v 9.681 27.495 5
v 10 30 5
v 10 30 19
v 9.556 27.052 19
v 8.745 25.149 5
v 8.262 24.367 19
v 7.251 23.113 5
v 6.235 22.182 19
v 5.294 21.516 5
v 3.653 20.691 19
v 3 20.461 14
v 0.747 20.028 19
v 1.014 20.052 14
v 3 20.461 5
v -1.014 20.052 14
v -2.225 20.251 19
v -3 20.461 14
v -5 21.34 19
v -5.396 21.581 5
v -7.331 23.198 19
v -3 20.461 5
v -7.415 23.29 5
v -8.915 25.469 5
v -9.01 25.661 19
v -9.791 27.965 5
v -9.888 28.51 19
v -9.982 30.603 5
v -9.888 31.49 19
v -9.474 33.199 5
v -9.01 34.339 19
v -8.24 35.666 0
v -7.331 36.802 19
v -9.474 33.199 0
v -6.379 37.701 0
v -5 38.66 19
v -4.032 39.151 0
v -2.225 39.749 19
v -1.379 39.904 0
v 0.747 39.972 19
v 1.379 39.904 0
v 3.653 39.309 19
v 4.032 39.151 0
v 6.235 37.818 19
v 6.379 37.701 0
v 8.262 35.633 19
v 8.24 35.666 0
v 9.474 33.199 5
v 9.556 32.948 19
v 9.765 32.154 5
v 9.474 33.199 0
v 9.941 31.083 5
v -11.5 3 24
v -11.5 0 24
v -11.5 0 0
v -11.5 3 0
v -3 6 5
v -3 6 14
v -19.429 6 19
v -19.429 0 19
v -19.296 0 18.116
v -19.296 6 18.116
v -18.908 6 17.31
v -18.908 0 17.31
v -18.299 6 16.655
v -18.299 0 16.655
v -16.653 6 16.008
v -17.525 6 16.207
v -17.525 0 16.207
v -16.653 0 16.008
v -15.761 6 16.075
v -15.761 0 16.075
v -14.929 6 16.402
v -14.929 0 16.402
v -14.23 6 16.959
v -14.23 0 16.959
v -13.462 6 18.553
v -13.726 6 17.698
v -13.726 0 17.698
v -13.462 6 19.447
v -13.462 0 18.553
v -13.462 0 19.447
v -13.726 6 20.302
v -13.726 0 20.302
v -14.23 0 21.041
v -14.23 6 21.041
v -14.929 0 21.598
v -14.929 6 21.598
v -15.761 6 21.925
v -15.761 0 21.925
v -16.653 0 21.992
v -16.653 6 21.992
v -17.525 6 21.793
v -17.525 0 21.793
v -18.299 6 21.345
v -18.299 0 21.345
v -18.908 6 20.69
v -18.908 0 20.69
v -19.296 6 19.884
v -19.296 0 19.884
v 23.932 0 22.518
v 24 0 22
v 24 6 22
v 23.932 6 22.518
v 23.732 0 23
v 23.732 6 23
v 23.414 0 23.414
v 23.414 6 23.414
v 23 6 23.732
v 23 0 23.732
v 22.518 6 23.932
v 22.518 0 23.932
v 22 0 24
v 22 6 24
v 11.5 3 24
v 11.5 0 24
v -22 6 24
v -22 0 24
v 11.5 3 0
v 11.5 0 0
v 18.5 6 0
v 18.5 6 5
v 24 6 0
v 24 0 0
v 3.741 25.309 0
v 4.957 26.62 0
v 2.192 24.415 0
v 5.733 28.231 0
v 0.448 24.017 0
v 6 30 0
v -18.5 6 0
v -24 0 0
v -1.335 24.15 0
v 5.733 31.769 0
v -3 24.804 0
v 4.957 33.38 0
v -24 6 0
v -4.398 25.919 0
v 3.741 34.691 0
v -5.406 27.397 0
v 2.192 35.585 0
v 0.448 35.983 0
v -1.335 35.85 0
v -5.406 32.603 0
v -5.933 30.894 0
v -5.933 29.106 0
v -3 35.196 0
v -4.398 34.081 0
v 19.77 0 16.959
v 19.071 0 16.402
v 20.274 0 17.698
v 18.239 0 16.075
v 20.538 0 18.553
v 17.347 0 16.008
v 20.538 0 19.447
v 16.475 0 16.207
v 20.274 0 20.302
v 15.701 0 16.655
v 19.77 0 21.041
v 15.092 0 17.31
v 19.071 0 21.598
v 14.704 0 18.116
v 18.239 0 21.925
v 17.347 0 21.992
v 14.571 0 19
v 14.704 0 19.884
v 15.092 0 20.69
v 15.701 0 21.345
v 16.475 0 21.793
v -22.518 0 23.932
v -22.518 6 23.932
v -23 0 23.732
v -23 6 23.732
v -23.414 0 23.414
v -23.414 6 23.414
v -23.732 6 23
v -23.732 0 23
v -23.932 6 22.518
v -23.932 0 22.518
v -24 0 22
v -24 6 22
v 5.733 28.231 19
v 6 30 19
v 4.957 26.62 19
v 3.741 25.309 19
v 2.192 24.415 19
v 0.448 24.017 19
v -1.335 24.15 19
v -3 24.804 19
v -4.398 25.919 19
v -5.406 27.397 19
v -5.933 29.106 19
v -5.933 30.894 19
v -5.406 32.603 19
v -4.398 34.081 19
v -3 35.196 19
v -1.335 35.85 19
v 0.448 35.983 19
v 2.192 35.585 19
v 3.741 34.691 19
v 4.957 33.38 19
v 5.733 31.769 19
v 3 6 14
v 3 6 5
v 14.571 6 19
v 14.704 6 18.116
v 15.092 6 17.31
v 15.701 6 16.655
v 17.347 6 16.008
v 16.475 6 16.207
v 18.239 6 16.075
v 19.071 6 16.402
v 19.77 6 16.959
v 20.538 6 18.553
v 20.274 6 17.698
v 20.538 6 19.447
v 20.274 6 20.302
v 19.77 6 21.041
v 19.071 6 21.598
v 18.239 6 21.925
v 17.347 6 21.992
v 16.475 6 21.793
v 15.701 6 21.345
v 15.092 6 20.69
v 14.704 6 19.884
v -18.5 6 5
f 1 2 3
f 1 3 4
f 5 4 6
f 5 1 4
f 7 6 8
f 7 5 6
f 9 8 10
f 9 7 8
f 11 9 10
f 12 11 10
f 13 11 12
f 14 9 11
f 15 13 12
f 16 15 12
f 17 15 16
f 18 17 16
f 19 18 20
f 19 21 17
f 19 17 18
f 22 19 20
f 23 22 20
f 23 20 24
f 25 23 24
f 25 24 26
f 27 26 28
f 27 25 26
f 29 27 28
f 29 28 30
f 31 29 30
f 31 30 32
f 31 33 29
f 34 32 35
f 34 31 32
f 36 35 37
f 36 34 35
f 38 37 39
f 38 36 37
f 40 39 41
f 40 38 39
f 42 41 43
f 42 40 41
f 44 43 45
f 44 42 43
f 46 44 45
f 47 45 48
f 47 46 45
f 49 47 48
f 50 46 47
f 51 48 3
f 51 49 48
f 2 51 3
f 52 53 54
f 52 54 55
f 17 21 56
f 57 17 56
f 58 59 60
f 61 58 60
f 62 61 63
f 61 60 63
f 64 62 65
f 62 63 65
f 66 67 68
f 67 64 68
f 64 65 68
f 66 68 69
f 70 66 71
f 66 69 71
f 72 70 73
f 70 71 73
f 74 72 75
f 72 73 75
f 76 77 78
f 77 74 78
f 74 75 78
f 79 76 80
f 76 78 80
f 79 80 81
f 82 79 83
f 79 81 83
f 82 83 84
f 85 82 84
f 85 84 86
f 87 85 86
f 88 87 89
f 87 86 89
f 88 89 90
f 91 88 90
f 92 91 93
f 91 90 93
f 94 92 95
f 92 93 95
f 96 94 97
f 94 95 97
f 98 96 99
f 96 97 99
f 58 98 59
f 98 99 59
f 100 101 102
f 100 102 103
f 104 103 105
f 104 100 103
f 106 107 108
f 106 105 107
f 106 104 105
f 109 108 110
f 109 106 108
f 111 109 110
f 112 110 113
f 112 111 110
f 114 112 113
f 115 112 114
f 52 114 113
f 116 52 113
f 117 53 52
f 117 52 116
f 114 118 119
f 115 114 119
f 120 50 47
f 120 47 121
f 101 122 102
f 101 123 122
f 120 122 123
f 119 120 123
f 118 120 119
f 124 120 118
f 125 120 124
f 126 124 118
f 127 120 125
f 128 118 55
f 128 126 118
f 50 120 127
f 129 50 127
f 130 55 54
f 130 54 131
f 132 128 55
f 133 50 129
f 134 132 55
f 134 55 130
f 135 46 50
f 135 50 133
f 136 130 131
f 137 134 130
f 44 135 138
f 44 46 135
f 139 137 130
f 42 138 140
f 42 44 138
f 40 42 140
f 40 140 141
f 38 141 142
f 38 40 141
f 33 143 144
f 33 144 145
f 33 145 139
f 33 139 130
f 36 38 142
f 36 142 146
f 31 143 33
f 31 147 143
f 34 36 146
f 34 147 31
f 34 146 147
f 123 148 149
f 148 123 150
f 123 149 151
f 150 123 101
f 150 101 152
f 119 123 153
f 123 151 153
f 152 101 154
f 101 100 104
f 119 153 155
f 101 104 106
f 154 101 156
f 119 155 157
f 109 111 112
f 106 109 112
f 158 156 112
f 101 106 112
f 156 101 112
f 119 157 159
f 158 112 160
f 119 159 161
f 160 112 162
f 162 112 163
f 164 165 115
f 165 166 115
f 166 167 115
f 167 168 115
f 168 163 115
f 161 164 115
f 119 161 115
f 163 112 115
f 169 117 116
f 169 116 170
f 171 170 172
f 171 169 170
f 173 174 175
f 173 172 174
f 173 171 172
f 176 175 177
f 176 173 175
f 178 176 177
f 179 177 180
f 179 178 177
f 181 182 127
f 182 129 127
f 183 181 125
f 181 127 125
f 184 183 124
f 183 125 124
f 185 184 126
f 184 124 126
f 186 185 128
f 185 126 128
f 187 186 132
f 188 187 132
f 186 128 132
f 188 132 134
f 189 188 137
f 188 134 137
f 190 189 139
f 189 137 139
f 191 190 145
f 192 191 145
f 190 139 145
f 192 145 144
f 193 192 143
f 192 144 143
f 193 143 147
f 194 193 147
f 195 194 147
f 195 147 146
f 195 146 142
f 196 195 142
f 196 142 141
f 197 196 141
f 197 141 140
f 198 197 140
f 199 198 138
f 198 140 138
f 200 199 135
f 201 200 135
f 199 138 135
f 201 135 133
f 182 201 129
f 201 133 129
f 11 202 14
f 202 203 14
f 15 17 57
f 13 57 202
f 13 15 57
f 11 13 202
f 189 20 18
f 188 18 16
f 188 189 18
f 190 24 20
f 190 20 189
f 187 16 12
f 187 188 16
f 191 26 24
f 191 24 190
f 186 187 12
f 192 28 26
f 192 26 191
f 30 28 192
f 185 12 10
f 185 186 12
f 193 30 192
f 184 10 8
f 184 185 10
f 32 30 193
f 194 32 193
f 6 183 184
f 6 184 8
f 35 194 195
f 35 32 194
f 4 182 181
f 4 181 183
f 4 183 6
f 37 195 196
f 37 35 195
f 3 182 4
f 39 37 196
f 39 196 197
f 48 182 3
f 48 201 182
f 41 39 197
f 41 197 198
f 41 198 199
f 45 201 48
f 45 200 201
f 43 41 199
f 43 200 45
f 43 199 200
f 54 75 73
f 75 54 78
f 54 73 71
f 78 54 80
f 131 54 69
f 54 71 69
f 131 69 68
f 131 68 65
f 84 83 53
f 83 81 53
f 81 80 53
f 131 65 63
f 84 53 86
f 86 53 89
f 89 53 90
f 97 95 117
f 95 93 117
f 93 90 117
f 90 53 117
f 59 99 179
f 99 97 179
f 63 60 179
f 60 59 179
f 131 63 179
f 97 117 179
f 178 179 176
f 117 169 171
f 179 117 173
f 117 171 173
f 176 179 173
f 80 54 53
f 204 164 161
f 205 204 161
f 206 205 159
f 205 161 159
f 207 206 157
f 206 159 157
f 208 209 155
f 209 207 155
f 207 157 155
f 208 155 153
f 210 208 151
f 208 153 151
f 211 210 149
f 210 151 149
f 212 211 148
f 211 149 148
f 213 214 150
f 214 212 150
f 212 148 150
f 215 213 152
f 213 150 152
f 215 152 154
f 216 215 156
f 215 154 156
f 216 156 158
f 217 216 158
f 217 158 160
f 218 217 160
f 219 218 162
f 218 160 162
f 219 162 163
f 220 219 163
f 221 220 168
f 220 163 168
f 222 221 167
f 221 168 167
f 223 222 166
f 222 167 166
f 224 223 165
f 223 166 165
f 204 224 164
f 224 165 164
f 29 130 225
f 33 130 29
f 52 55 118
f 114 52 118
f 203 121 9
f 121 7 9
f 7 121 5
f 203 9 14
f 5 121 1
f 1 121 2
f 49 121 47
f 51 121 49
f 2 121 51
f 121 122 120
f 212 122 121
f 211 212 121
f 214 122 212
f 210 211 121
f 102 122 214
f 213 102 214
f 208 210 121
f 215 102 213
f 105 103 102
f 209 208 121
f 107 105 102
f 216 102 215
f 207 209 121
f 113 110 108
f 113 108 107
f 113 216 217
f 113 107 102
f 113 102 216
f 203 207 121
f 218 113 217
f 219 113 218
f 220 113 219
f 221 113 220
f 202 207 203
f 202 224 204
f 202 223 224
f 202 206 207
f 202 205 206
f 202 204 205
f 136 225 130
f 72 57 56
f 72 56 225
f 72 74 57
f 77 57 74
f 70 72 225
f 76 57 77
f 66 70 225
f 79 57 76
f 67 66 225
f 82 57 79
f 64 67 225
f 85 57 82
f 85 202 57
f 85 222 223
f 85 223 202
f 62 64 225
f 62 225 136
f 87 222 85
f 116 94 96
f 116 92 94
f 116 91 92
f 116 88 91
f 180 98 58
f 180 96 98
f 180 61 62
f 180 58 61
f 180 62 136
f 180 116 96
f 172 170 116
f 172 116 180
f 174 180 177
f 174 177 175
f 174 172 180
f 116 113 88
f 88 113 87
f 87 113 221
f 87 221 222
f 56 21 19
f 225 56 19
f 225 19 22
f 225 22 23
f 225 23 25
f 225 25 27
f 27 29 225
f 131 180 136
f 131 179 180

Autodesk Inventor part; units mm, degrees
ref_plane "YZ Plane" through (0, 0, 0) normal (1, 0, 0) x (0, 1, 0)
ref_plane "XZ Plane" through (0, 0, 0) normal (0, 1, 0) x (-1, 0, 0)
ref_plane "XY Plane" through (0, 0, 0) normal (0, 0, 1) x (1, 0, 0)
sketch "草图1" plane through (0, 0, 0) normal (0, 1, 0) x (-1, 0, 0)
  line L0 (24, 0) -> (-24, 0)
  line L1 (-24, 0) -> (-24, 22)
  line L2 (-22, 24) -> (22, 24)
  line L3 (24, 22) -> (24, 0)
  line L4 (0, 29.295577) -> (0, -8.008859)
  arc A0 (24, 22) -> (22, 24) centre (22, 22) ccw
  arc A1 (-22, 24) -> (-24, 22) centre (-22, 22) ccw
  line L5 (28.197943, 19) -> (-37.870085, 19) construction
  circle A2 centre (16.428853, 19) radius 3
  circle A3 centre (-17.571147, 19) radius 3
  point P0 (0, 0)
  point P1 (-24, 24)
  dimension "d0" = 24
  dimension "d1" = 48
  dimension "d2" = 2
  dimension "d3" = 5
  dimension "d4" = 6
  dimension "d5" = 6
  dimension "d6" = 34
extrude "拉伸1" add sketch "草图1" along normal blind 6
sketch "草图2" plane through (0, 0, 0) normal (0, 0, 1) x (1, 0, 0)
  line L0 (22, 0) -> (-22, 0) projected
  line L1 (22, 0) -> (22, 6) projected
  line L2 (-22, 6) -> (22, 6) projected
  line L3 (-22, 0) -> (-22, 6) projected
  line L4 (11.5, -3) -> (-11.5, -3)
  line L5 (-11.5, -3) -> (-11.5, 3)
  line L6 (-11.5, 3) -> (11.5, 3)
  line L7 (11.5, 3) -> (11.5, -3)
  line L8 (11.5, -3) -> (-11.5, 3) construction
  line L9 (-11.5, -3) -> (11.5, 3) construction
  point P0 (0, 0)
  dimension "d9" = 23
  dimension "d10" = 6
extrude "拉伸2" cut sketch "草图2" along normal blind 30 contours L7 L4 L5 L0 | L0 L5 L6 L7
sketch "草图3" plane through (0, 0, 0) normal (0, 0, 1) x (1, 0, 0)
  circle A0 centre (0, 30) radius 10
  line L0 (11.5, 3) -> (11.5, 0)
  line L1 (22, 0) -> (11.5, 0)
  line L2 (22, 0) -> (22, 6)
  line L3 (-22, 6) -> (22, 6)
  line L4 (-22, 0) -> (-22, 6)
  line L5 (-11.5, 0) -> (-22, 0)
  line L6 (-11.5, 0) -> (-11.5, 3)
  line L7 (-11.5, 3) -> (11.5, 3)
  line L8 (0, -6.997144) -> (0, 46.686565)
  circle A1 centre (0, 30) radius 6
  point P0 (0, 0)
  dimension "d13" = 20
  dimension "d14" = 30
  dimension "d15" = 12
extrude "拉伸3" add sketch "草图3" along normal blind 19 contours A0 L8 A1 | L8 A1 A0
sketch "草图4" plane through (0, 30, 0) normal (0, 0, -1) x (-1, 0, 0)
  circle A0 centre (0, 0) radius 10
  line L0 (-11.5, -30) -> (-11.5, -27)
  line L1 (-11.5, -27) -> (11.5, -27)
  line L2 (11.5, -27) -> (11.5, -30)
  line L3 (24, -30) -> (11.5, -30)
  line L4 (24, -30) -> (24, -24)
  line L5 (-24, -24) -> (24, -24)
  line L6 (-24, -30) -> (-24, -24)
  line L7 (-11.5, -30) -> (-24, -30)
  line L8 (-9.4744, 3.199335) -> (-18.5, -24)
  line L9 (9.4744, 3.199335) -> (18.5, -24)
  line L10 (0, -31.113393) -> (0, 9.909735)
  point P0 (0, -30)
  dimension "d18" = 37
sketch "草图4 outline for 拉伸4" plane through (0, 30, 0) normal (0, 0, -1) x (-1, 0, 0)
  line L0 (18.5, -24) -> (9.4744, 3.199335)
  line L1 (-18.5, -24) -> (18.5, -24)
  line L2 (-9.4744, 3.199335) -> (-18.5, -24)
  arc A0 (-9.4744, 3.199335) -> (9.4744, 3.199335) centre (0, 0) ccw
extrude "拉伸4" add sketch "草图4 outline for 拉伸4" against normal blind 5
sketch "草图5" plane through (0, 30, 5) normal (0, 0, 1) x (1, 0, 0)
  arc A0 (-9.507538, 3.099472) -> (9.507538, 3.099472) centre (0, 0) ccw
  line L0 (18.5, -24) -> (-18.5, -24)
  line L1 (3, -8) -> (-3, -8)
  line L2 (-3, -8) -> (-3, -24)
  line L3 (-3, -24) -> (3, -24)
  line L4 (3, -24) -> (3, -8)
  line L5 (3, -8) -> (-3, -24) construction
  line L6 (-3, -8) -> (3, -24) construction
  line L7 (0, -30) -> (0, 0)
  point P0 (0, -16)
  point P1 (0, -16)
  dimension "d21" = 16
  dimension "d22" = 6
extrude "拉伸5" add sketch "草图5" along normal blind 9
